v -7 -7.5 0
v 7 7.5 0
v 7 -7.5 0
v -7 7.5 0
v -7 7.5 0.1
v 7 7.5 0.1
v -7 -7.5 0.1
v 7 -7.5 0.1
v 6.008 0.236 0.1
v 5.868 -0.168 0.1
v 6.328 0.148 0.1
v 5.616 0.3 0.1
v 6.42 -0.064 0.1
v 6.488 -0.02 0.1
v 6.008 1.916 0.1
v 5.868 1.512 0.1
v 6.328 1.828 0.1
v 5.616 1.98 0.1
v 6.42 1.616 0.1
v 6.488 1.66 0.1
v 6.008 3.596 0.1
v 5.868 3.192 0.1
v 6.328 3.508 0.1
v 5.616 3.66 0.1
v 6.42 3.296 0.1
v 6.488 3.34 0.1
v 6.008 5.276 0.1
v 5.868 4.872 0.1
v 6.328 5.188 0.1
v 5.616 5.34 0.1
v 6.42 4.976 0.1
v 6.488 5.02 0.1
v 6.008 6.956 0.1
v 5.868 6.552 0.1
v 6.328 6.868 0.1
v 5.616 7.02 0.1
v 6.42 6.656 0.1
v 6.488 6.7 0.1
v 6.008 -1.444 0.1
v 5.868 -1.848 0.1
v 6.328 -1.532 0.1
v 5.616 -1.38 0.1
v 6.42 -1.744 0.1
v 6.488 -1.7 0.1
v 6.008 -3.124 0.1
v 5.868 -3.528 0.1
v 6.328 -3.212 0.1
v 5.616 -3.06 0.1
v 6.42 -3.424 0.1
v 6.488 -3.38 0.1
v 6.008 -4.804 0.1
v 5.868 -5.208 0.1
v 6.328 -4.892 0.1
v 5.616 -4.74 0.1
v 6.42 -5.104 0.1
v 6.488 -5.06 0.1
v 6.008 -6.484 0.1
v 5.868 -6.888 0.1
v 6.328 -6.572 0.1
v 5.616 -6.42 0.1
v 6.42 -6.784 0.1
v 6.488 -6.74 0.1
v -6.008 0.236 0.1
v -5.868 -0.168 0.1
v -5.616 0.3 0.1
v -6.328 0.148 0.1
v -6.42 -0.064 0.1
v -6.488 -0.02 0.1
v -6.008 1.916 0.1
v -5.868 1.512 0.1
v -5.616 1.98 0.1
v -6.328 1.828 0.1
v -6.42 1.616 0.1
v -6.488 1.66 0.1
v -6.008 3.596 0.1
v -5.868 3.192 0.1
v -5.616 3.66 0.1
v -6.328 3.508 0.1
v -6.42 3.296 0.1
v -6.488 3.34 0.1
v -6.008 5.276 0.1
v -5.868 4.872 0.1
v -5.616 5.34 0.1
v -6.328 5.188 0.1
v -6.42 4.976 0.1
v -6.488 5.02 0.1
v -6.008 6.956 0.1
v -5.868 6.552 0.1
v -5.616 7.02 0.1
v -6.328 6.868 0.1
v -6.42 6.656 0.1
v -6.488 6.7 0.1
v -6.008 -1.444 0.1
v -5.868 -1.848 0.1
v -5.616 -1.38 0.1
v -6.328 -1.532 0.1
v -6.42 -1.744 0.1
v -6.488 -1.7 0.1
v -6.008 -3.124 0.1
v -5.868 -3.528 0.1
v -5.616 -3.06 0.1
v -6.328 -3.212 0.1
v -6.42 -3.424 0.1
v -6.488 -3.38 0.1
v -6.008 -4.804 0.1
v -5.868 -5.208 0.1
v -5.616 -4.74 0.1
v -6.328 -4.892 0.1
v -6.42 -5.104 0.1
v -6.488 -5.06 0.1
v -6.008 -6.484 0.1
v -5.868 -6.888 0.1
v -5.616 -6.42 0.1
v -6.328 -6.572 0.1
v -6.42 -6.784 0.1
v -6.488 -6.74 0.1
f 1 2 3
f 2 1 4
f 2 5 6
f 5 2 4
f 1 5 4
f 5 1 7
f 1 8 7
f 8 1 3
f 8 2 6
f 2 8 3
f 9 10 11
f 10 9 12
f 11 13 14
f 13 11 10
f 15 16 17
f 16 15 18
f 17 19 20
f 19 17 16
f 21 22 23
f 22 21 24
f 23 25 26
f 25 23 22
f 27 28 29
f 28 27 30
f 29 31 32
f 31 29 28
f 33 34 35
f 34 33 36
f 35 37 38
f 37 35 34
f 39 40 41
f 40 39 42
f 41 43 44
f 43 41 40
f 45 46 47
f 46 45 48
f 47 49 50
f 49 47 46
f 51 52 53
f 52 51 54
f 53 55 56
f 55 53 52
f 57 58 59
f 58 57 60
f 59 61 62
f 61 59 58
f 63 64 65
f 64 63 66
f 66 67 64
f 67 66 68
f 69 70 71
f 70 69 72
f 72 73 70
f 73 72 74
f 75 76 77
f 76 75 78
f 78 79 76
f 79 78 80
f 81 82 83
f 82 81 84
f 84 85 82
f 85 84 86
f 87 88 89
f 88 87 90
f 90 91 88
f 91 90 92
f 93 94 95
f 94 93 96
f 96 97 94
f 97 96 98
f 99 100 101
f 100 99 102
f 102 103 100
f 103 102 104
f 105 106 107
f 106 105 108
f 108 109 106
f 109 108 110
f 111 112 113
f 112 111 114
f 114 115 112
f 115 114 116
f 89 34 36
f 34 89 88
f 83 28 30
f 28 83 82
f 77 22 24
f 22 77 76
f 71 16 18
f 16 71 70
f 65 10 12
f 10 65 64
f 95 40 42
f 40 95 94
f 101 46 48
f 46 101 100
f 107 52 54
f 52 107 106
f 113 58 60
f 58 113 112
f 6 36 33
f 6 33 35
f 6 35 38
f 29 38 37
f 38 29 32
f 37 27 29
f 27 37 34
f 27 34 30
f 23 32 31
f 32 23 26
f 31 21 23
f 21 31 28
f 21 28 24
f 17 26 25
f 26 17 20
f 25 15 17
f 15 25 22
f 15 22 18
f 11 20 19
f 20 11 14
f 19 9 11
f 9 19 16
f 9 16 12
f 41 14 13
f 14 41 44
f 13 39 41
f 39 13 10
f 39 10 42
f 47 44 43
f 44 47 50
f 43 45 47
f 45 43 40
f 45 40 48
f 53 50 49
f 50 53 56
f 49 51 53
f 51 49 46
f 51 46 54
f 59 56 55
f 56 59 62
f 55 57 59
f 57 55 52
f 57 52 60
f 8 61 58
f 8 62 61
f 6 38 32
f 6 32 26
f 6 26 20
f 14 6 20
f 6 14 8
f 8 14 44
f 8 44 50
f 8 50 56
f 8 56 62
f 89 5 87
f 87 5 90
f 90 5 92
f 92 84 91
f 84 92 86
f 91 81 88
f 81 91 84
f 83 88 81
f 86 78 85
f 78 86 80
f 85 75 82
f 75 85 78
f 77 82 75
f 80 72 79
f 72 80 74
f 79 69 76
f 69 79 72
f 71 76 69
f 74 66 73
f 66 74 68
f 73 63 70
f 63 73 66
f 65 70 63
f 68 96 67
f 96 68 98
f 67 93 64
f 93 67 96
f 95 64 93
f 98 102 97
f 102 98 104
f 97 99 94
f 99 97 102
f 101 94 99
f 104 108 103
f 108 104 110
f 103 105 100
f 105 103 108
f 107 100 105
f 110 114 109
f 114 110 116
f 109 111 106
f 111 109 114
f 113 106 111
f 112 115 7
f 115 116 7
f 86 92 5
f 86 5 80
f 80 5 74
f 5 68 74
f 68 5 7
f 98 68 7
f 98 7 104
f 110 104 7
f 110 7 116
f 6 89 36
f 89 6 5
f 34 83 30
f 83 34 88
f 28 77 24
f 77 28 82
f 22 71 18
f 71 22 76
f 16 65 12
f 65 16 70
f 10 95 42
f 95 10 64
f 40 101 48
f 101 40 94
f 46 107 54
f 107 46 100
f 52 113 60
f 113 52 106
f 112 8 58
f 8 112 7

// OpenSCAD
// file: ../p/box5-12.scad
use <../lib.scad>
function ldraw_lib__box5_12() = [
// 0 Box with 5 Faces without Any Edges
// 0 Name: box5-12.dat
// 0 Author: Chris Dee [cwdee]
// 0 !LDRAW_ORG Primitive UPDATE 2009-02
// 0 !LICENSE Licensed under CC BY 4.0 : see CAreadme.txt
// 
// 0 BFC CERTIFY CCW
  [0,"BFC","CERTIFY"],
  [0,"BFC","CCW"],
// 
// 0 !HISTORY 2009-09-03 [PTadmin] Official Update 2009-02
// 
// 
// 4 16 1 1 1 1 1 -1 -1 1 -1 -1 1 1
  [4,16,1,1,1,1,1,-1,-1,1,-1,-1,1,1],
// 4 16 -1 0 1 1 0 1 1 1 1 -1 1 1
  [4,16,-1,0,1,1,0,1,1,1,1,-1,1,1],
// 4 16 -1 0 -1 -1 0 1 -1 1 1 -1 1 -1
  [4,16,-1,0,-1,-1,0,1,-1,1,1,-1,1,-1],
// 4 16 1 0 -1 -1 0 -1 -1 1 -1 1 1 -1
  [4,16,1,0,-1,-1,0,-1,-1,1,-1,1,1,-1],
// 4 16 1 0 1 1 0 -1 1 1 -1 1 1 1
  [4,16,1,0,1,1,0,-1,1,1,-1,1,1,1],
// 0
];
module ldraw_lib__box5_12(step=0, col=false, unit=2/5, alt=false, line=0.2, solid=!$preview)
    makepoly(ldraw_lib__box5_12(), step=step, col=col, unit=unit, alt=alt, line=line, solid=solid);
ldraw_lib__box5_12(line=0.2);
// main file
use <../lib.scad>
use <../p/box5-12.scad>
use <s/6296256fs01.scad>
function ldraw_lib__6372023f() = [
// 0 Sticker  1.9 x  1.8 with 9 Air Outlet Gills on Bright Light Blue
// 0 Name: 6372023f.dat
// 0 Author: Magnus Forsberg [MagFors]
// 0 !LDRAW_ORG Part UPDATE 2024-05
// 0 !LICENSE Licensed under CC BY 4.0 : see CAreadme.txt
// 
// 0 BFC CERTIFY CCW
  [0,"BFC","CERTIFY"],
  [0,"BFC","CCW"],
// 
// 0 !KEYWORDS 500, Bricklink 77942stk01, Brickowl 1064764, Cinquecento, FIAT
// 0 !KEYWORDS Nuova, Rebrickable 83460, set 77942
// 
// 0 !HISTORY 2024-06-30 [OrionP] Official Update 2024-05
// 
// 
// 1 16 0 -.25 0 17.5 0 0 0 .25 0 0 0 18.75 box5-12.dat
  [1,16,0,-.25,0,17.5,0,0,0,.25,0,0,0,18.75, ldraw_lib__box5_12()],
// 1 212 0 0 0 1 0 0 0 1 0 0 0 1 s\6296256fs01.dat
  [1,212,0,0,0,1,0,0,0,1,0,0,0,1, ldraw_lib__s__6296256fs01()],
];
module ldraw_lib__6372023f(step=0, col=false, unit=2/5, alt=false, line=0.2, solid=!$preview)
    makepoly(ldraw_lib__6372023f(), step=step, col=col, unit=unit, alt=alt, line=line, solid=solid);
ldraw_lib__6372023f(line=0.2);
